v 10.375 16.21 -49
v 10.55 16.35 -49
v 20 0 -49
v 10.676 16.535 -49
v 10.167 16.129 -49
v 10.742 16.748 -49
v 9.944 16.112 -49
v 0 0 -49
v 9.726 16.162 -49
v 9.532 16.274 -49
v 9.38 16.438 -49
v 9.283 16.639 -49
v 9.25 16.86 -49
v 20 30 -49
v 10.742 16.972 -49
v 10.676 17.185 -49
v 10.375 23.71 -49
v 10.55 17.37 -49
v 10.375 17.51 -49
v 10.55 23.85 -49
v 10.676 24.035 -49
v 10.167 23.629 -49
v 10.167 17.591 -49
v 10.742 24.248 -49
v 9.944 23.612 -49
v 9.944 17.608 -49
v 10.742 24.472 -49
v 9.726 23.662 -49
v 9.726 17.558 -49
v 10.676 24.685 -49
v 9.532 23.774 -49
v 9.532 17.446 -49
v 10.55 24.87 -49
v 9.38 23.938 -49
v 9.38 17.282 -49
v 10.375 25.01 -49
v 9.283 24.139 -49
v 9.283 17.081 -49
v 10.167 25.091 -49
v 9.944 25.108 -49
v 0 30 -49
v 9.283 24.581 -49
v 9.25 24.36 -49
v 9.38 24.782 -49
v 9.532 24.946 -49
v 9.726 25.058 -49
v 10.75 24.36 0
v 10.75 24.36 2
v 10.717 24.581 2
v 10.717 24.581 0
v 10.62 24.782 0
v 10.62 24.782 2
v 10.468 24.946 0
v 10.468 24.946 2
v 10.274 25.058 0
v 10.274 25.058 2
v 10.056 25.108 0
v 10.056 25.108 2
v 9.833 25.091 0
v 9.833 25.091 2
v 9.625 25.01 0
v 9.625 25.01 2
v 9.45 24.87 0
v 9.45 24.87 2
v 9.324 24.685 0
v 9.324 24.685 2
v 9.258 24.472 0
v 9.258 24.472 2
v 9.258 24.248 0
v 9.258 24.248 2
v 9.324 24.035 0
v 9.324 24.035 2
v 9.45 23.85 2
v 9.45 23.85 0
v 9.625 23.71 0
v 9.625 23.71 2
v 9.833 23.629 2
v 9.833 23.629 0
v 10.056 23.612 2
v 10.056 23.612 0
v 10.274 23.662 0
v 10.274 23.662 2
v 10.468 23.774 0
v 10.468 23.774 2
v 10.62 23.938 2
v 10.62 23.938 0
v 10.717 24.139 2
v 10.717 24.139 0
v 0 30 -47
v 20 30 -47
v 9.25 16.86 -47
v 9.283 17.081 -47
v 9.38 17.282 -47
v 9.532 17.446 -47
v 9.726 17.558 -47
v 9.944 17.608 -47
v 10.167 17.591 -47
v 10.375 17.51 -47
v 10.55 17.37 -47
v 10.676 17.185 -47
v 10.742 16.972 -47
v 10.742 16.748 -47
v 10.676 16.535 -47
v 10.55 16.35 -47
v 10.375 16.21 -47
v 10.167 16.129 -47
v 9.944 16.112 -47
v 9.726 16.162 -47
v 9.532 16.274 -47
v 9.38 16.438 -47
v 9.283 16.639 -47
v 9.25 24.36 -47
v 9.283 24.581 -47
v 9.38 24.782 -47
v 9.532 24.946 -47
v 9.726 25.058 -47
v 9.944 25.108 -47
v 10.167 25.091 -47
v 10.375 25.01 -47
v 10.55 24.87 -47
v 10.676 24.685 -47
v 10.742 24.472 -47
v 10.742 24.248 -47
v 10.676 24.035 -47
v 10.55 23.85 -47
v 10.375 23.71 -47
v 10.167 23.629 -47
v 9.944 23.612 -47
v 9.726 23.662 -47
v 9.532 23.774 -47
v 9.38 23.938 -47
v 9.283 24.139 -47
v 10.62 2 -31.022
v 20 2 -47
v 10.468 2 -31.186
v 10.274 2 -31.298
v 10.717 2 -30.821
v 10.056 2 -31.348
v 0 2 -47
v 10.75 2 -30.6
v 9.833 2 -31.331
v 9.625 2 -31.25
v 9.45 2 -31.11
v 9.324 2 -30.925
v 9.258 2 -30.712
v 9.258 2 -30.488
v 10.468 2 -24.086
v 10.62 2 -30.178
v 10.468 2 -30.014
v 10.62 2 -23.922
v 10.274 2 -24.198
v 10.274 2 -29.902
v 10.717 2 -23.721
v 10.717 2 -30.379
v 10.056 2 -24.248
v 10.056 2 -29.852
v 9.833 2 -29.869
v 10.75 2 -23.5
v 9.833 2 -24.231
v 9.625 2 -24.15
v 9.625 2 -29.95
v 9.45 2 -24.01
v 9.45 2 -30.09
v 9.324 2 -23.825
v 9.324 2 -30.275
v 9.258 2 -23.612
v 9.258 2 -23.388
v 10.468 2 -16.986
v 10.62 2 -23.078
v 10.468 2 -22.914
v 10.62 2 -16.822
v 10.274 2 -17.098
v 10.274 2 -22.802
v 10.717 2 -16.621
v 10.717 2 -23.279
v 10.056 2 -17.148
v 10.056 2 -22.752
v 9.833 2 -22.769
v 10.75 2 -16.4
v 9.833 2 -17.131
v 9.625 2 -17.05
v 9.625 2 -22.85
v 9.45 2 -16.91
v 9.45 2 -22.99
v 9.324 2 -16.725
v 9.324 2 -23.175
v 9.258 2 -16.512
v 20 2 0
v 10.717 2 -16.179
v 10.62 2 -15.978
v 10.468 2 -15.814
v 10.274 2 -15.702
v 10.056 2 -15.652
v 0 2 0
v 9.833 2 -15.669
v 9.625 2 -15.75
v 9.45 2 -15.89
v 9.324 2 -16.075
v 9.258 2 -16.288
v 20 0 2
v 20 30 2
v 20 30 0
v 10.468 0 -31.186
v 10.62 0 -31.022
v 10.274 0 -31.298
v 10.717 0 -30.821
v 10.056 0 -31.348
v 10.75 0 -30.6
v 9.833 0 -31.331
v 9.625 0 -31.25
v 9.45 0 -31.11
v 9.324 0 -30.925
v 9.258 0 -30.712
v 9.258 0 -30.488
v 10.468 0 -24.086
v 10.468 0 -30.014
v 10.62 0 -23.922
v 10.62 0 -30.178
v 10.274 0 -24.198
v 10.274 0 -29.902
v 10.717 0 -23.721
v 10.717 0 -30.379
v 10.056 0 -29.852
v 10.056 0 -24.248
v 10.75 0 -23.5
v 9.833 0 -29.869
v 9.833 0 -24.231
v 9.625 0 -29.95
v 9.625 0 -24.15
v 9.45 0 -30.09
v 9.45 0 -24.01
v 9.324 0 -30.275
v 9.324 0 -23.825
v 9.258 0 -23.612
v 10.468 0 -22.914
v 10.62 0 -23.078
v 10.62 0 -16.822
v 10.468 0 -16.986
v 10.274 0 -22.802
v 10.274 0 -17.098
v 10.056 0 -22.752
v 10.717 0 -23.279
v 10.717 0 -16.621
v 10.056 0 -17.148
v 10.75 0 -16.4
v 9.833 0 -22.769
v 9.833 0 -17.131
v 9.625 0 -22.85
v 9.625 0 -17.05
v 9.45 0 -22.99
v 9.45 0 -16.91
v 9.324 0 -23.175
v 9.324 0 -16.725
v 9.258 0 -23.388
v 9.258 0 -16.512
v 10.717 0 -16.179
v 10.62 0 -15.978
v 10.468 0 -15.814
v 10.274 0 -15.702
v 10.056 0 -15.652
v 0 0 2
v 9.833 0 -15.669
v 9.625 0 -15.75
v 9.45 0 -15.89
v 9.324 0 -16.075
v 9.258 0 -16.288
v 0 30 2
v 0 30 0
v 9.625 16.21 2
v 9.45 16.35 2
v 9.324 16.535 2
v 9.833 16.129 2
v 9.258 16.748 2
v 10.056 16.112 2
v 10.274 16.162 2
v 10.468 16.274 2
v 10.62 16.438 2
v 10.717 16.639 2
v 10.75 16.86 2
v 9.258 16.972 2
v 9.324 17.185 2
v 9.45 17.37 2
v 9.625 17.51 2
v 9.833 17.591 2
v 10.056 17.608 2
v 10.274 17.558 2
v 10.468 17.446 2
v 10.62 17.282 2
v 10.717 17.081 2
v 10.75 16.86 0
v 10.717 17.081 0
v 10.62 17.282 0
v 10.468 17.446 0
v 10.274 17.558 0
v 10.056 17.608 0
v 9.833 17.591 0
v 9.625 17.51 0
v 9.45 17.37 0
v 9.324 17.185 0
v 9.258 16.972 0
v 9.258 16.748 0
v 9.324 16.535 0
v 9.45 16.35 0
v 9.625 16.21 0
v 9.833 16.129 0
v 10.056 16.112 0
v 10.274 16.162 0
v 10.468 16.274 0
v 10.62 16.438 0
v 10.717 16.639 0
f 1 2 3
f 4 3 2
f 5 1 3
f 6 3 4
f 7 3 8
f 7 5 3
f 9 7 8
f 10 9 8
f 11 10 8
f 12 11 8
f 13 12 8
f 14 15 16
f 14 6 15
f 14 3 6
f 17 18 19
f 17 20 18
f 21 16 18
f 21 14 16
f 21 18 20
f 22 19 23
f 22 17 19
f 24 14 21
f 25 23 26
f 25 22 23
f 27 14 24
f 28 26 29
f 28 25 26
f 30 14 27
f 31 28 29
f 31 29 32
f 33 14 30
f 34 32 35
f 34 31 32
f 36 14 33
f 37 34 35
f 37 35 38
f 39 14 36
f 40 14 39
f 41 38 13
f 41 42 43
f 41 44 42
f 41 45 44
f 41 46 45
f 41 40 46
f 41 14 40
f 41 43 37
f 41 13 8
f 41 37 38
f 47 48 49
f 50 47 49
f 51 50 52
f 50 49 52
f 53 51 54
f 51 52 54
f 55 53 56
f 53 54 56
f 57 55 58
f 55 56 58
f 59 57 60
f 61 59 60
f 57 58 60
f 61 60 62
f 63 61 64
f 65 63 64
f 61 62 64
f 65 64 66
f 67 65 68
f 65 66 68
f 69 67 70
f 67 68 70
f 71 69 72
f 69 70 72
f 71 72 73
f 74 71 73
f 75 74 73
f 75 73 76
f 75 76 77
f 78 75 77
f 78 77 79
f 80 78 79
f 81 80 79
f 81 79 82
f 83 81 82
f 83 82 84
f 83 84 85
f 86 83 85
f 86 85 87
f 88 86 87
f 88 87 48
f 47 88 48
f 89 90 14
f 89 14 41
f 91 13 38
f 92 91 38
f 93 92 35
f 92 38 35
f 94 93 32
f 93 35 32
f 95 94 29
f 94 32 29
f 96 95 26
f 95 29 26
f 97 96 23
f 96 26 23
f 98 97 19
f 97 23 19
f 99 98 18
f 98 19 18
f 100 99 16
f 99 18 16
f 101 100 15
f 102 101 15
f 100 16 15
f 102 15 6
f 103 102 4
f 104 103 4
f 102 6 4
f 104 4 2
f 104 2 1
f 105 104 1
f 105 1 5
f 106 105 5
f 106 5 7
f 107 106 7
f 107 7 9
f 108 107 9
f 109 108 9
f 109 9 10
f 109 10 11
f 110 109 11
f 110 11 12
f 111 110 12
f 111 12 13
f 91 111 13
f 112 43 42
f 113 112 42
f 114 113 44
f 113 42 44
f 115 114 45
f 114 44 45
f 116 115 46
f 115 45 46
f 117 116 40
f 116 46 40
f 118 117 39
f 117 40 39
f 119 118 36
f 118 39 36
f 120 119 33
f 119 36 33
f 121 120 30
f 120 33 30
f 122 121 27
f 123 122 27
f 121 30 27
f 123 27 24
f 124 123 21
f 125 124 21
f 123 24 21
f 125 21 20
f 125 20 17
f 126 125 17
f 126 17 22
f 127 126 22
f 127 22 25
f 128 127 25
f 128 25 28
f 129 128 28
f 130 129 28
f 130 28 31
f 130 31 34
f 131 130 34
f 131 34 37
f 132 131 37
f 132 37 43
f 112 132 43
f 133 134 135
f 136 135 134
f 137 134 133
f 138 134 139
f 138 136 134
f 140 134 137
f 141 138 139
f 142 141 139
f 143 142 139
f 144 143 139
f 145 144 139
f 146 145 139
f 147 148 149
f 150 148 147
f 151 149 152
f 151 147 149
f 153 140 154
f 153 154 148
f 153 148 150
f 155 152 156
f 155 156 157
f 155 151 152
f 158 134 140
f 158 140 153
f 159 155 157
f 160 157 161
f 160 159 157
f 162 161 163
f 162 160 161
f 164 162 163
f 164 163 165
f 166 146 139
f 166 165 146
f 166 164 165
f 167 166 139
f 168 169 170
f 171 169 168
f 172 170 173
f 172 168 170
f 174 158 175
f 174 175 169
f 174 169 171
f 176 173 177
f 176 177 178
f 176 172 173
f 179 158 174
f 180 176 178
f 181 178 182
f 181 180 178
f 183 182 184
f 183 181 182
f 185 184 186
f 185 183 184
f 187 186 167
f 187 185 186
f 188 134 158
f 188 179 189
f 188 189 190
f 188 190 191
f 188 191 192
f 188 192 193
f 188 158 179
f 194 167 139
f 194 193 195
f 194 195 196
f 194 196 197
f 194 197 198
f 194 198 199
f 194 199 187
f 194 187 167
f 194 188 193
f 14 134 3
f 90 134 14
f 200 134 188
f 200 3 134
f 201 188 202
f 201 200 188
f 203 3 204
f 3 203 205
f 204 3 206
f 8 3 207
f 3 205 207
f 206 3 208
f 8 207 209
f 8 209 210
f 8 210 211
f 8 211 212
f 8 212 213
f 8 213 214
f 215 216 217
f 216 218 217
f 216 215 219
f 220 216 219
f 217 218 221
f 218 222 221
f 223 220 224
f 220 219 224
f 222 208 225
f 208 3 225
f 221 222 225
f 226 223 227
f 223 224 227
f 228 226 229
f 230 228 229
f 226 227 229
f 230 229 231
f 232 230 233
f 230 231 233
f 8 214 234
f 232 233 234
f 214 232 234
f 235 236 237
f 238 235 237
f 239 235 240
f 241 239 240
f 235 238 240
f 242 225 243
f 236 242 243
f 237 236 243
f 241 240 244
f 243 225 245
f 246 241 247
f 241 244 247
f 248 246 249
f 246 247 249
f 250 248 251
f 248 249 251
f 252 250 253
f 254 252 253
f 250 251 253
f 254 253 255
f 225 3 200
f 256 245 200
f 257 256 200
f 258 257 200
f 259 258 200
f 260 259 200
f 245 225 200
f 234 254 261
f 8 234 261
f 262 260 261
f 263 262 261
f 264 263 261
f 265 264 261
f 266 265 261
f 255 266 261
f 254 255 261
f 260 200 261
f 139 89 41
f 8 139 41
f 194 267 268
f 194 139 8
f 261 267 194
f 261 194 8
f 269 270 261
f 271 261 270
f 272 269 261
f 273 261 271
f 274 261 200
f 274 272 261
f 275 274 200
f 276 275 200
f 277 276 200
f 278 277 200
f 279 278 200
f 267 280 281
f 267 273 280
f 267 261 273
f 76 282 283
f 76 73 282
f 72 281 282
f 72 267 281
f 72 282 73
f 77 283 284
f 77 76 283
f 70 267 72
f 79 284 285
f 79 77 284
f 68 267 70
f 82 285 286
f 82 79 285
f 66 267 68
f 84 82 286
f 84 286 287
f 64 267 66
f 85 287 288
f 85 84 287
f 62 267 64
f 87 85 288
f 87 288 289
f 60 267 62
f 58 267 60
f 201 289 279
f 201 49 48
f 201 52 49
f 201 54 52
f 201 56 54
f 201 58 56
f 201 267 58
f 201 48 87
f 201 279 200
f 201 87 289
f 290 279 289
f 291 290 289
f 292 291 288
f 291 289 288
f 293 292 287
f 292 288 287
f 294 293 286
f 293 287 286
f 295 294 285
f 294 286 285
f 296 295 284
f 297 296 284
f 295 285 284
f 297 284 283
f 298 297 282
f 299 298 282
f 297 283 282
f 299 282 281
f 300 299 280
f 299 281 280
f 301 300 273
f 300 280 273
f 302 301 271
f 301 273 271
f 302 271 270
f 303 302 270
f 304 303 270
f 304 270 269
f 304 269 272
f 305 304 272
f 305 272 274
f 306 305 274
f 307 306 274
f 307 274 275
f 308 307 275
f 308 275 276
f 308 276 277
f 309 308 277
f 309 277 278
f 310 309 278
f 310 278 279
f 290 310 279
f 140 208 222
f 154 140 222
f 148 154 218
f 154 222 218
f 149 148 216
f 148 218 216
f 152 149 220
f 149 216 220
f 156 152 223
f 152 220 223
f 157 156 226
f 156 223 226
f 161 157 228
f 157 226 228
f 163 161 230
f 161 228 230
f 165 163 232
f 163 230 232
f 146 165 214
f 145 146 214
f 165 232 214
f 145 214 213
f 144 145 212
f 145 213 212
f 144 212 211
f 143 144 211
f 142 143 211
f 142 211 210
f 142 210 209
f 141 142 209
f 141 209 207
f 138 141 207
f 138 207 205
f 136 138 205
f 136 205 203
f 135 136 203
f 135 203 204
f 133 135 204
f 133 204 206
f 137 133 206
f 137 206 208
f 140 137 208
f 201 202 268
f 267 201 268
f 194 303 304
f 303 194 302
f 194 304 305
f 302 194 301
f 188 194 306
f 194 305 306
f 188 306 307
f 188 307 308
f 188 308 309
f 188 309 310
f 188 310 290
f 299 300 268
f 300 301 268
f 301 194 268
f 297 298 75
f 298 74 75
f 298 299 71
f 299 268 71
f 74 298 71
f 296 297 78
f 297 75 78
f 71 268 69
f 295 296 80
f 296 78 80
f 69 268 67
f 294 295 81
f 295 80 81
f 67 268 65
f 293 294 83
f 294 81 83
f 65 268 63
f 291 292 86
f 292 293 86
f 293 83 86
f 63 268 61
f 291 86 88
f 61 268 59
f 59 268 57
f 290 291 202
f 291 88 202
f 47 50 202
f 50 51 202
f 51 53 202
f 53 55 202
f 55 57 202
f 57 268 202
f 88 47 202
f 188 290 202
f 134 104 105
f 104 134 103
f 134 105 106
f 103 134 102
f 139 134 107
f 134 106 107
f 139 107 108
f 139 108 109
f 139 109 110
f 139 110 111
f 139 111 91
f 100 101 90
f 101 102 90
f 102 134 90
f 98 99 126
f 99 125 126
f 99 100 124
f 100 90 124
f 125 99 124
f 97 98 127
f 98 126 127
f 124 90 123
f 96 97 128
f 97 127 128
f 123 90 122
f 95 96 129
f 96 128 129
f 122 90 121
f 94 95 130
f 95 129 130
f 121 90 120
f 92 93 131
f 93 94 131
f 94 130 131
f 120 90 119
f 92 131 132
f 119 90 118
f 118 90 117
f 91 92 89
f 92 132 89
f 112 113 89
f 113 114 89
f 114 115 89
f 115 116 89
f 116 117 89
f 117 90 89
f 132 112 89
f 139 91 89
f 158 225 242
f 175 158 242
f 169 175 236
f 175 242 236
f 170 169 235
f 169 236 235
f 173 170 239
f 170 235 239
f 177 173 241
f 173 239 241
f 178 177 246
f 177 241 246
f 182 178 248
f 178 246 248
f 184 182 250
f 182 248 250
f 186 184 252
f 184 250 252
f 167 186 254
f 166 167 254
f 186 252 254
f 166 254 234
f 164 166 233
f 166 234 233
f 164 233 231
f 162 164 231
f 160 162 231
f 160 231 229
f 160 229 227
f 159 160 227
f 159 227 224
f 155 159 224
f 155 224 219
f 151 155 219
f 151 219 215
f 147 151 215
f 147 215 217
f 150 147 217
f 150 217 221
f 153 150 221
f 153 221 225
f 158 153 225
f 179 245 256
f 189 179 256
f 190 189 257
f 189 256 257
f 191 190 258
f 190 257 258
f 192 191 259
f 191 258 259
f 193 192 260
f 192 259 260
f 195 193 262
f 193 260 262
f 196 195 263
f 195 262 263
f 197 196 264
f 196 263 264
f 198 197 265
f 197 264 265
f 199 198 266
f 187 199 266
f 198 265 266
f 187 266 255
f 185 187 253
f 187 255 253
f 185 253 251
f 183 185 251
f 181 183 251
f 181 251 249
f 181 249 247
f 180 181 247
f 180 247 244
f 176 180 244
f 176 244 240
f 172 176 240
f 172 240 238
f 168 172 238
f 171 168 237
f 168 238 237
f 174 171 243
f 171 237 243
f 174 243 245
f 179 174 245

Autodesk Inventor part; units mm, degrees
ref_plane "YZ Plane" through (0, 0, 0) normal (1, 0, 0) x (0, 1, 0)
ref_plane "XZ Plane" through (0, 0, 0) normal (0, 1, 0) x (-1, 0, 0)
ref_plane "XY Plane" through (0, 0, 0) normal (0, 0, 1) x (1, 0, 0)
sketch "Sketch9" plane through (0, 0, 0) normal (0, 1, 0) x (-1, 0, 0)
  line L0 (0, 0) -> (-20, 0)
  line L1 (-20, 0) -> (-20, -47)
  line L2 (-20, -47) -> (0, -47)
  line L3 (0, -47) -> (0, 0)
  dimension "d20" = 20
  dimension "d21" = 47
extrude "Extrusion6" add sketch "Sketch9" along normal blind 2
sketch "Sketch10" plane through (0, 0, 0) normal (0, 0, 1) x (1, 0, 0)
  line L0 (0, 0) -> (20, 0) projected
  line L1 (0, 0) -> (20, 0)
  line L2 (20, 0) -> (20, 30)
  line L3 (20, 30) -> (0, 30)
  line L4 (0, 30) -> (0, 0)
  dimension "d24" = 30
  dimension "d40" = 20
extrude "Extrusion7" add sketch "Sketch10" along normal blind 2
sketch "Sketch11" plane through (20, 0, -47) normal (0, 0, -1) x (-1, 0, 0)
  line L0 (0, 2) -> (0, 30) projected
  line L1 (0, 0) -> (20, 0) projected
  line L2 (0, 30) -> (20, 30)
  line L3 (20, 30) -> (20, 0)
  line L4 (20, 0) -> (0, 0)
  line L5 (0, 0) -> (0, 30)
  dimension "d39" = 30
extrude "Extrusion8" add sketch "Sketch11" along normal blind 2
sketch "Sketch12" plane through (20, 0, -49) normal (0, 0, -1) x (-1, 0, 0)
  circle A0 centre (10, 24.36) radius 0.75
  line L0 (20, 30) -> (0, 30) projected
  line L1 (0, 30) -> (0, 0) projected
  point P0 (20, 0)
  dimension "d29" = 1.5
  dimension "d30" = 5.64
  dimension "d31" = 10
extrude "Extrusion9" cut sketch "Sketch12" against normal blind 2
sketch "Sketch13" plane through (20, 0, -49) normal (0, 0, -1) x (-1, 0, 0)
  circle A0 centre (10, 16.86) radius 0.75
  line L0 (0, 30) -> (0, 0) projected
  circle A1 centre (10, 24.36) radius 0.75 projected
  point P0 (20, 0)
  dimension "d34" = 1.5
  dimension "d35" = 10
  dimension "d36" = 7.5
extrude "Extrusion10" cut sketch "Sketch13" against normal blind 2 contours A0
sketch "Sketch14" plane through (0, 0, 0) normal (0, -1, 0) x (1, 0, 0)
  circle A0 centre (10, -23.5) radius 0.75
  line L0 (0, 2) -> (0, -49) projected
  line L1 (20, -47) -> (0, -47) projected
  circle A1 centre (10, -30.6) radius 0.75
  circle A2 centre (10, -16.4) radius 0.75
  point P0 (0, 0)
  dimension "d41" = 1.5
  dimension "d42" = 10
  dimension "d43" = 23.5
  dimension "d44" = 1.5
  dimension "d45" = 7.1
  dimension "d46" = 1.5
  dimension "d47" = 7.1
extrude "Extrusion11" cut sketch "Sketch14" against normal blind 10
sketch "Sketch15" plane through (0, 0, 2) normal (0, 0, 1) x (1, 0, 0)
  circle A0 centre (10, 24.36) radius 0.75 projected
  circle A1 centre (10, 24.36) radius 0.75
  circle A2 centre (10, 16.86) radius 0.75 projected
  circle A3 centre (10, 16.86) radius 0.75
  point P0 (0, 0)
extrude "Extrusion12" cut sketch "Sketch15" against normal blind 2
properties part number "Servo Holder Upper Part"
